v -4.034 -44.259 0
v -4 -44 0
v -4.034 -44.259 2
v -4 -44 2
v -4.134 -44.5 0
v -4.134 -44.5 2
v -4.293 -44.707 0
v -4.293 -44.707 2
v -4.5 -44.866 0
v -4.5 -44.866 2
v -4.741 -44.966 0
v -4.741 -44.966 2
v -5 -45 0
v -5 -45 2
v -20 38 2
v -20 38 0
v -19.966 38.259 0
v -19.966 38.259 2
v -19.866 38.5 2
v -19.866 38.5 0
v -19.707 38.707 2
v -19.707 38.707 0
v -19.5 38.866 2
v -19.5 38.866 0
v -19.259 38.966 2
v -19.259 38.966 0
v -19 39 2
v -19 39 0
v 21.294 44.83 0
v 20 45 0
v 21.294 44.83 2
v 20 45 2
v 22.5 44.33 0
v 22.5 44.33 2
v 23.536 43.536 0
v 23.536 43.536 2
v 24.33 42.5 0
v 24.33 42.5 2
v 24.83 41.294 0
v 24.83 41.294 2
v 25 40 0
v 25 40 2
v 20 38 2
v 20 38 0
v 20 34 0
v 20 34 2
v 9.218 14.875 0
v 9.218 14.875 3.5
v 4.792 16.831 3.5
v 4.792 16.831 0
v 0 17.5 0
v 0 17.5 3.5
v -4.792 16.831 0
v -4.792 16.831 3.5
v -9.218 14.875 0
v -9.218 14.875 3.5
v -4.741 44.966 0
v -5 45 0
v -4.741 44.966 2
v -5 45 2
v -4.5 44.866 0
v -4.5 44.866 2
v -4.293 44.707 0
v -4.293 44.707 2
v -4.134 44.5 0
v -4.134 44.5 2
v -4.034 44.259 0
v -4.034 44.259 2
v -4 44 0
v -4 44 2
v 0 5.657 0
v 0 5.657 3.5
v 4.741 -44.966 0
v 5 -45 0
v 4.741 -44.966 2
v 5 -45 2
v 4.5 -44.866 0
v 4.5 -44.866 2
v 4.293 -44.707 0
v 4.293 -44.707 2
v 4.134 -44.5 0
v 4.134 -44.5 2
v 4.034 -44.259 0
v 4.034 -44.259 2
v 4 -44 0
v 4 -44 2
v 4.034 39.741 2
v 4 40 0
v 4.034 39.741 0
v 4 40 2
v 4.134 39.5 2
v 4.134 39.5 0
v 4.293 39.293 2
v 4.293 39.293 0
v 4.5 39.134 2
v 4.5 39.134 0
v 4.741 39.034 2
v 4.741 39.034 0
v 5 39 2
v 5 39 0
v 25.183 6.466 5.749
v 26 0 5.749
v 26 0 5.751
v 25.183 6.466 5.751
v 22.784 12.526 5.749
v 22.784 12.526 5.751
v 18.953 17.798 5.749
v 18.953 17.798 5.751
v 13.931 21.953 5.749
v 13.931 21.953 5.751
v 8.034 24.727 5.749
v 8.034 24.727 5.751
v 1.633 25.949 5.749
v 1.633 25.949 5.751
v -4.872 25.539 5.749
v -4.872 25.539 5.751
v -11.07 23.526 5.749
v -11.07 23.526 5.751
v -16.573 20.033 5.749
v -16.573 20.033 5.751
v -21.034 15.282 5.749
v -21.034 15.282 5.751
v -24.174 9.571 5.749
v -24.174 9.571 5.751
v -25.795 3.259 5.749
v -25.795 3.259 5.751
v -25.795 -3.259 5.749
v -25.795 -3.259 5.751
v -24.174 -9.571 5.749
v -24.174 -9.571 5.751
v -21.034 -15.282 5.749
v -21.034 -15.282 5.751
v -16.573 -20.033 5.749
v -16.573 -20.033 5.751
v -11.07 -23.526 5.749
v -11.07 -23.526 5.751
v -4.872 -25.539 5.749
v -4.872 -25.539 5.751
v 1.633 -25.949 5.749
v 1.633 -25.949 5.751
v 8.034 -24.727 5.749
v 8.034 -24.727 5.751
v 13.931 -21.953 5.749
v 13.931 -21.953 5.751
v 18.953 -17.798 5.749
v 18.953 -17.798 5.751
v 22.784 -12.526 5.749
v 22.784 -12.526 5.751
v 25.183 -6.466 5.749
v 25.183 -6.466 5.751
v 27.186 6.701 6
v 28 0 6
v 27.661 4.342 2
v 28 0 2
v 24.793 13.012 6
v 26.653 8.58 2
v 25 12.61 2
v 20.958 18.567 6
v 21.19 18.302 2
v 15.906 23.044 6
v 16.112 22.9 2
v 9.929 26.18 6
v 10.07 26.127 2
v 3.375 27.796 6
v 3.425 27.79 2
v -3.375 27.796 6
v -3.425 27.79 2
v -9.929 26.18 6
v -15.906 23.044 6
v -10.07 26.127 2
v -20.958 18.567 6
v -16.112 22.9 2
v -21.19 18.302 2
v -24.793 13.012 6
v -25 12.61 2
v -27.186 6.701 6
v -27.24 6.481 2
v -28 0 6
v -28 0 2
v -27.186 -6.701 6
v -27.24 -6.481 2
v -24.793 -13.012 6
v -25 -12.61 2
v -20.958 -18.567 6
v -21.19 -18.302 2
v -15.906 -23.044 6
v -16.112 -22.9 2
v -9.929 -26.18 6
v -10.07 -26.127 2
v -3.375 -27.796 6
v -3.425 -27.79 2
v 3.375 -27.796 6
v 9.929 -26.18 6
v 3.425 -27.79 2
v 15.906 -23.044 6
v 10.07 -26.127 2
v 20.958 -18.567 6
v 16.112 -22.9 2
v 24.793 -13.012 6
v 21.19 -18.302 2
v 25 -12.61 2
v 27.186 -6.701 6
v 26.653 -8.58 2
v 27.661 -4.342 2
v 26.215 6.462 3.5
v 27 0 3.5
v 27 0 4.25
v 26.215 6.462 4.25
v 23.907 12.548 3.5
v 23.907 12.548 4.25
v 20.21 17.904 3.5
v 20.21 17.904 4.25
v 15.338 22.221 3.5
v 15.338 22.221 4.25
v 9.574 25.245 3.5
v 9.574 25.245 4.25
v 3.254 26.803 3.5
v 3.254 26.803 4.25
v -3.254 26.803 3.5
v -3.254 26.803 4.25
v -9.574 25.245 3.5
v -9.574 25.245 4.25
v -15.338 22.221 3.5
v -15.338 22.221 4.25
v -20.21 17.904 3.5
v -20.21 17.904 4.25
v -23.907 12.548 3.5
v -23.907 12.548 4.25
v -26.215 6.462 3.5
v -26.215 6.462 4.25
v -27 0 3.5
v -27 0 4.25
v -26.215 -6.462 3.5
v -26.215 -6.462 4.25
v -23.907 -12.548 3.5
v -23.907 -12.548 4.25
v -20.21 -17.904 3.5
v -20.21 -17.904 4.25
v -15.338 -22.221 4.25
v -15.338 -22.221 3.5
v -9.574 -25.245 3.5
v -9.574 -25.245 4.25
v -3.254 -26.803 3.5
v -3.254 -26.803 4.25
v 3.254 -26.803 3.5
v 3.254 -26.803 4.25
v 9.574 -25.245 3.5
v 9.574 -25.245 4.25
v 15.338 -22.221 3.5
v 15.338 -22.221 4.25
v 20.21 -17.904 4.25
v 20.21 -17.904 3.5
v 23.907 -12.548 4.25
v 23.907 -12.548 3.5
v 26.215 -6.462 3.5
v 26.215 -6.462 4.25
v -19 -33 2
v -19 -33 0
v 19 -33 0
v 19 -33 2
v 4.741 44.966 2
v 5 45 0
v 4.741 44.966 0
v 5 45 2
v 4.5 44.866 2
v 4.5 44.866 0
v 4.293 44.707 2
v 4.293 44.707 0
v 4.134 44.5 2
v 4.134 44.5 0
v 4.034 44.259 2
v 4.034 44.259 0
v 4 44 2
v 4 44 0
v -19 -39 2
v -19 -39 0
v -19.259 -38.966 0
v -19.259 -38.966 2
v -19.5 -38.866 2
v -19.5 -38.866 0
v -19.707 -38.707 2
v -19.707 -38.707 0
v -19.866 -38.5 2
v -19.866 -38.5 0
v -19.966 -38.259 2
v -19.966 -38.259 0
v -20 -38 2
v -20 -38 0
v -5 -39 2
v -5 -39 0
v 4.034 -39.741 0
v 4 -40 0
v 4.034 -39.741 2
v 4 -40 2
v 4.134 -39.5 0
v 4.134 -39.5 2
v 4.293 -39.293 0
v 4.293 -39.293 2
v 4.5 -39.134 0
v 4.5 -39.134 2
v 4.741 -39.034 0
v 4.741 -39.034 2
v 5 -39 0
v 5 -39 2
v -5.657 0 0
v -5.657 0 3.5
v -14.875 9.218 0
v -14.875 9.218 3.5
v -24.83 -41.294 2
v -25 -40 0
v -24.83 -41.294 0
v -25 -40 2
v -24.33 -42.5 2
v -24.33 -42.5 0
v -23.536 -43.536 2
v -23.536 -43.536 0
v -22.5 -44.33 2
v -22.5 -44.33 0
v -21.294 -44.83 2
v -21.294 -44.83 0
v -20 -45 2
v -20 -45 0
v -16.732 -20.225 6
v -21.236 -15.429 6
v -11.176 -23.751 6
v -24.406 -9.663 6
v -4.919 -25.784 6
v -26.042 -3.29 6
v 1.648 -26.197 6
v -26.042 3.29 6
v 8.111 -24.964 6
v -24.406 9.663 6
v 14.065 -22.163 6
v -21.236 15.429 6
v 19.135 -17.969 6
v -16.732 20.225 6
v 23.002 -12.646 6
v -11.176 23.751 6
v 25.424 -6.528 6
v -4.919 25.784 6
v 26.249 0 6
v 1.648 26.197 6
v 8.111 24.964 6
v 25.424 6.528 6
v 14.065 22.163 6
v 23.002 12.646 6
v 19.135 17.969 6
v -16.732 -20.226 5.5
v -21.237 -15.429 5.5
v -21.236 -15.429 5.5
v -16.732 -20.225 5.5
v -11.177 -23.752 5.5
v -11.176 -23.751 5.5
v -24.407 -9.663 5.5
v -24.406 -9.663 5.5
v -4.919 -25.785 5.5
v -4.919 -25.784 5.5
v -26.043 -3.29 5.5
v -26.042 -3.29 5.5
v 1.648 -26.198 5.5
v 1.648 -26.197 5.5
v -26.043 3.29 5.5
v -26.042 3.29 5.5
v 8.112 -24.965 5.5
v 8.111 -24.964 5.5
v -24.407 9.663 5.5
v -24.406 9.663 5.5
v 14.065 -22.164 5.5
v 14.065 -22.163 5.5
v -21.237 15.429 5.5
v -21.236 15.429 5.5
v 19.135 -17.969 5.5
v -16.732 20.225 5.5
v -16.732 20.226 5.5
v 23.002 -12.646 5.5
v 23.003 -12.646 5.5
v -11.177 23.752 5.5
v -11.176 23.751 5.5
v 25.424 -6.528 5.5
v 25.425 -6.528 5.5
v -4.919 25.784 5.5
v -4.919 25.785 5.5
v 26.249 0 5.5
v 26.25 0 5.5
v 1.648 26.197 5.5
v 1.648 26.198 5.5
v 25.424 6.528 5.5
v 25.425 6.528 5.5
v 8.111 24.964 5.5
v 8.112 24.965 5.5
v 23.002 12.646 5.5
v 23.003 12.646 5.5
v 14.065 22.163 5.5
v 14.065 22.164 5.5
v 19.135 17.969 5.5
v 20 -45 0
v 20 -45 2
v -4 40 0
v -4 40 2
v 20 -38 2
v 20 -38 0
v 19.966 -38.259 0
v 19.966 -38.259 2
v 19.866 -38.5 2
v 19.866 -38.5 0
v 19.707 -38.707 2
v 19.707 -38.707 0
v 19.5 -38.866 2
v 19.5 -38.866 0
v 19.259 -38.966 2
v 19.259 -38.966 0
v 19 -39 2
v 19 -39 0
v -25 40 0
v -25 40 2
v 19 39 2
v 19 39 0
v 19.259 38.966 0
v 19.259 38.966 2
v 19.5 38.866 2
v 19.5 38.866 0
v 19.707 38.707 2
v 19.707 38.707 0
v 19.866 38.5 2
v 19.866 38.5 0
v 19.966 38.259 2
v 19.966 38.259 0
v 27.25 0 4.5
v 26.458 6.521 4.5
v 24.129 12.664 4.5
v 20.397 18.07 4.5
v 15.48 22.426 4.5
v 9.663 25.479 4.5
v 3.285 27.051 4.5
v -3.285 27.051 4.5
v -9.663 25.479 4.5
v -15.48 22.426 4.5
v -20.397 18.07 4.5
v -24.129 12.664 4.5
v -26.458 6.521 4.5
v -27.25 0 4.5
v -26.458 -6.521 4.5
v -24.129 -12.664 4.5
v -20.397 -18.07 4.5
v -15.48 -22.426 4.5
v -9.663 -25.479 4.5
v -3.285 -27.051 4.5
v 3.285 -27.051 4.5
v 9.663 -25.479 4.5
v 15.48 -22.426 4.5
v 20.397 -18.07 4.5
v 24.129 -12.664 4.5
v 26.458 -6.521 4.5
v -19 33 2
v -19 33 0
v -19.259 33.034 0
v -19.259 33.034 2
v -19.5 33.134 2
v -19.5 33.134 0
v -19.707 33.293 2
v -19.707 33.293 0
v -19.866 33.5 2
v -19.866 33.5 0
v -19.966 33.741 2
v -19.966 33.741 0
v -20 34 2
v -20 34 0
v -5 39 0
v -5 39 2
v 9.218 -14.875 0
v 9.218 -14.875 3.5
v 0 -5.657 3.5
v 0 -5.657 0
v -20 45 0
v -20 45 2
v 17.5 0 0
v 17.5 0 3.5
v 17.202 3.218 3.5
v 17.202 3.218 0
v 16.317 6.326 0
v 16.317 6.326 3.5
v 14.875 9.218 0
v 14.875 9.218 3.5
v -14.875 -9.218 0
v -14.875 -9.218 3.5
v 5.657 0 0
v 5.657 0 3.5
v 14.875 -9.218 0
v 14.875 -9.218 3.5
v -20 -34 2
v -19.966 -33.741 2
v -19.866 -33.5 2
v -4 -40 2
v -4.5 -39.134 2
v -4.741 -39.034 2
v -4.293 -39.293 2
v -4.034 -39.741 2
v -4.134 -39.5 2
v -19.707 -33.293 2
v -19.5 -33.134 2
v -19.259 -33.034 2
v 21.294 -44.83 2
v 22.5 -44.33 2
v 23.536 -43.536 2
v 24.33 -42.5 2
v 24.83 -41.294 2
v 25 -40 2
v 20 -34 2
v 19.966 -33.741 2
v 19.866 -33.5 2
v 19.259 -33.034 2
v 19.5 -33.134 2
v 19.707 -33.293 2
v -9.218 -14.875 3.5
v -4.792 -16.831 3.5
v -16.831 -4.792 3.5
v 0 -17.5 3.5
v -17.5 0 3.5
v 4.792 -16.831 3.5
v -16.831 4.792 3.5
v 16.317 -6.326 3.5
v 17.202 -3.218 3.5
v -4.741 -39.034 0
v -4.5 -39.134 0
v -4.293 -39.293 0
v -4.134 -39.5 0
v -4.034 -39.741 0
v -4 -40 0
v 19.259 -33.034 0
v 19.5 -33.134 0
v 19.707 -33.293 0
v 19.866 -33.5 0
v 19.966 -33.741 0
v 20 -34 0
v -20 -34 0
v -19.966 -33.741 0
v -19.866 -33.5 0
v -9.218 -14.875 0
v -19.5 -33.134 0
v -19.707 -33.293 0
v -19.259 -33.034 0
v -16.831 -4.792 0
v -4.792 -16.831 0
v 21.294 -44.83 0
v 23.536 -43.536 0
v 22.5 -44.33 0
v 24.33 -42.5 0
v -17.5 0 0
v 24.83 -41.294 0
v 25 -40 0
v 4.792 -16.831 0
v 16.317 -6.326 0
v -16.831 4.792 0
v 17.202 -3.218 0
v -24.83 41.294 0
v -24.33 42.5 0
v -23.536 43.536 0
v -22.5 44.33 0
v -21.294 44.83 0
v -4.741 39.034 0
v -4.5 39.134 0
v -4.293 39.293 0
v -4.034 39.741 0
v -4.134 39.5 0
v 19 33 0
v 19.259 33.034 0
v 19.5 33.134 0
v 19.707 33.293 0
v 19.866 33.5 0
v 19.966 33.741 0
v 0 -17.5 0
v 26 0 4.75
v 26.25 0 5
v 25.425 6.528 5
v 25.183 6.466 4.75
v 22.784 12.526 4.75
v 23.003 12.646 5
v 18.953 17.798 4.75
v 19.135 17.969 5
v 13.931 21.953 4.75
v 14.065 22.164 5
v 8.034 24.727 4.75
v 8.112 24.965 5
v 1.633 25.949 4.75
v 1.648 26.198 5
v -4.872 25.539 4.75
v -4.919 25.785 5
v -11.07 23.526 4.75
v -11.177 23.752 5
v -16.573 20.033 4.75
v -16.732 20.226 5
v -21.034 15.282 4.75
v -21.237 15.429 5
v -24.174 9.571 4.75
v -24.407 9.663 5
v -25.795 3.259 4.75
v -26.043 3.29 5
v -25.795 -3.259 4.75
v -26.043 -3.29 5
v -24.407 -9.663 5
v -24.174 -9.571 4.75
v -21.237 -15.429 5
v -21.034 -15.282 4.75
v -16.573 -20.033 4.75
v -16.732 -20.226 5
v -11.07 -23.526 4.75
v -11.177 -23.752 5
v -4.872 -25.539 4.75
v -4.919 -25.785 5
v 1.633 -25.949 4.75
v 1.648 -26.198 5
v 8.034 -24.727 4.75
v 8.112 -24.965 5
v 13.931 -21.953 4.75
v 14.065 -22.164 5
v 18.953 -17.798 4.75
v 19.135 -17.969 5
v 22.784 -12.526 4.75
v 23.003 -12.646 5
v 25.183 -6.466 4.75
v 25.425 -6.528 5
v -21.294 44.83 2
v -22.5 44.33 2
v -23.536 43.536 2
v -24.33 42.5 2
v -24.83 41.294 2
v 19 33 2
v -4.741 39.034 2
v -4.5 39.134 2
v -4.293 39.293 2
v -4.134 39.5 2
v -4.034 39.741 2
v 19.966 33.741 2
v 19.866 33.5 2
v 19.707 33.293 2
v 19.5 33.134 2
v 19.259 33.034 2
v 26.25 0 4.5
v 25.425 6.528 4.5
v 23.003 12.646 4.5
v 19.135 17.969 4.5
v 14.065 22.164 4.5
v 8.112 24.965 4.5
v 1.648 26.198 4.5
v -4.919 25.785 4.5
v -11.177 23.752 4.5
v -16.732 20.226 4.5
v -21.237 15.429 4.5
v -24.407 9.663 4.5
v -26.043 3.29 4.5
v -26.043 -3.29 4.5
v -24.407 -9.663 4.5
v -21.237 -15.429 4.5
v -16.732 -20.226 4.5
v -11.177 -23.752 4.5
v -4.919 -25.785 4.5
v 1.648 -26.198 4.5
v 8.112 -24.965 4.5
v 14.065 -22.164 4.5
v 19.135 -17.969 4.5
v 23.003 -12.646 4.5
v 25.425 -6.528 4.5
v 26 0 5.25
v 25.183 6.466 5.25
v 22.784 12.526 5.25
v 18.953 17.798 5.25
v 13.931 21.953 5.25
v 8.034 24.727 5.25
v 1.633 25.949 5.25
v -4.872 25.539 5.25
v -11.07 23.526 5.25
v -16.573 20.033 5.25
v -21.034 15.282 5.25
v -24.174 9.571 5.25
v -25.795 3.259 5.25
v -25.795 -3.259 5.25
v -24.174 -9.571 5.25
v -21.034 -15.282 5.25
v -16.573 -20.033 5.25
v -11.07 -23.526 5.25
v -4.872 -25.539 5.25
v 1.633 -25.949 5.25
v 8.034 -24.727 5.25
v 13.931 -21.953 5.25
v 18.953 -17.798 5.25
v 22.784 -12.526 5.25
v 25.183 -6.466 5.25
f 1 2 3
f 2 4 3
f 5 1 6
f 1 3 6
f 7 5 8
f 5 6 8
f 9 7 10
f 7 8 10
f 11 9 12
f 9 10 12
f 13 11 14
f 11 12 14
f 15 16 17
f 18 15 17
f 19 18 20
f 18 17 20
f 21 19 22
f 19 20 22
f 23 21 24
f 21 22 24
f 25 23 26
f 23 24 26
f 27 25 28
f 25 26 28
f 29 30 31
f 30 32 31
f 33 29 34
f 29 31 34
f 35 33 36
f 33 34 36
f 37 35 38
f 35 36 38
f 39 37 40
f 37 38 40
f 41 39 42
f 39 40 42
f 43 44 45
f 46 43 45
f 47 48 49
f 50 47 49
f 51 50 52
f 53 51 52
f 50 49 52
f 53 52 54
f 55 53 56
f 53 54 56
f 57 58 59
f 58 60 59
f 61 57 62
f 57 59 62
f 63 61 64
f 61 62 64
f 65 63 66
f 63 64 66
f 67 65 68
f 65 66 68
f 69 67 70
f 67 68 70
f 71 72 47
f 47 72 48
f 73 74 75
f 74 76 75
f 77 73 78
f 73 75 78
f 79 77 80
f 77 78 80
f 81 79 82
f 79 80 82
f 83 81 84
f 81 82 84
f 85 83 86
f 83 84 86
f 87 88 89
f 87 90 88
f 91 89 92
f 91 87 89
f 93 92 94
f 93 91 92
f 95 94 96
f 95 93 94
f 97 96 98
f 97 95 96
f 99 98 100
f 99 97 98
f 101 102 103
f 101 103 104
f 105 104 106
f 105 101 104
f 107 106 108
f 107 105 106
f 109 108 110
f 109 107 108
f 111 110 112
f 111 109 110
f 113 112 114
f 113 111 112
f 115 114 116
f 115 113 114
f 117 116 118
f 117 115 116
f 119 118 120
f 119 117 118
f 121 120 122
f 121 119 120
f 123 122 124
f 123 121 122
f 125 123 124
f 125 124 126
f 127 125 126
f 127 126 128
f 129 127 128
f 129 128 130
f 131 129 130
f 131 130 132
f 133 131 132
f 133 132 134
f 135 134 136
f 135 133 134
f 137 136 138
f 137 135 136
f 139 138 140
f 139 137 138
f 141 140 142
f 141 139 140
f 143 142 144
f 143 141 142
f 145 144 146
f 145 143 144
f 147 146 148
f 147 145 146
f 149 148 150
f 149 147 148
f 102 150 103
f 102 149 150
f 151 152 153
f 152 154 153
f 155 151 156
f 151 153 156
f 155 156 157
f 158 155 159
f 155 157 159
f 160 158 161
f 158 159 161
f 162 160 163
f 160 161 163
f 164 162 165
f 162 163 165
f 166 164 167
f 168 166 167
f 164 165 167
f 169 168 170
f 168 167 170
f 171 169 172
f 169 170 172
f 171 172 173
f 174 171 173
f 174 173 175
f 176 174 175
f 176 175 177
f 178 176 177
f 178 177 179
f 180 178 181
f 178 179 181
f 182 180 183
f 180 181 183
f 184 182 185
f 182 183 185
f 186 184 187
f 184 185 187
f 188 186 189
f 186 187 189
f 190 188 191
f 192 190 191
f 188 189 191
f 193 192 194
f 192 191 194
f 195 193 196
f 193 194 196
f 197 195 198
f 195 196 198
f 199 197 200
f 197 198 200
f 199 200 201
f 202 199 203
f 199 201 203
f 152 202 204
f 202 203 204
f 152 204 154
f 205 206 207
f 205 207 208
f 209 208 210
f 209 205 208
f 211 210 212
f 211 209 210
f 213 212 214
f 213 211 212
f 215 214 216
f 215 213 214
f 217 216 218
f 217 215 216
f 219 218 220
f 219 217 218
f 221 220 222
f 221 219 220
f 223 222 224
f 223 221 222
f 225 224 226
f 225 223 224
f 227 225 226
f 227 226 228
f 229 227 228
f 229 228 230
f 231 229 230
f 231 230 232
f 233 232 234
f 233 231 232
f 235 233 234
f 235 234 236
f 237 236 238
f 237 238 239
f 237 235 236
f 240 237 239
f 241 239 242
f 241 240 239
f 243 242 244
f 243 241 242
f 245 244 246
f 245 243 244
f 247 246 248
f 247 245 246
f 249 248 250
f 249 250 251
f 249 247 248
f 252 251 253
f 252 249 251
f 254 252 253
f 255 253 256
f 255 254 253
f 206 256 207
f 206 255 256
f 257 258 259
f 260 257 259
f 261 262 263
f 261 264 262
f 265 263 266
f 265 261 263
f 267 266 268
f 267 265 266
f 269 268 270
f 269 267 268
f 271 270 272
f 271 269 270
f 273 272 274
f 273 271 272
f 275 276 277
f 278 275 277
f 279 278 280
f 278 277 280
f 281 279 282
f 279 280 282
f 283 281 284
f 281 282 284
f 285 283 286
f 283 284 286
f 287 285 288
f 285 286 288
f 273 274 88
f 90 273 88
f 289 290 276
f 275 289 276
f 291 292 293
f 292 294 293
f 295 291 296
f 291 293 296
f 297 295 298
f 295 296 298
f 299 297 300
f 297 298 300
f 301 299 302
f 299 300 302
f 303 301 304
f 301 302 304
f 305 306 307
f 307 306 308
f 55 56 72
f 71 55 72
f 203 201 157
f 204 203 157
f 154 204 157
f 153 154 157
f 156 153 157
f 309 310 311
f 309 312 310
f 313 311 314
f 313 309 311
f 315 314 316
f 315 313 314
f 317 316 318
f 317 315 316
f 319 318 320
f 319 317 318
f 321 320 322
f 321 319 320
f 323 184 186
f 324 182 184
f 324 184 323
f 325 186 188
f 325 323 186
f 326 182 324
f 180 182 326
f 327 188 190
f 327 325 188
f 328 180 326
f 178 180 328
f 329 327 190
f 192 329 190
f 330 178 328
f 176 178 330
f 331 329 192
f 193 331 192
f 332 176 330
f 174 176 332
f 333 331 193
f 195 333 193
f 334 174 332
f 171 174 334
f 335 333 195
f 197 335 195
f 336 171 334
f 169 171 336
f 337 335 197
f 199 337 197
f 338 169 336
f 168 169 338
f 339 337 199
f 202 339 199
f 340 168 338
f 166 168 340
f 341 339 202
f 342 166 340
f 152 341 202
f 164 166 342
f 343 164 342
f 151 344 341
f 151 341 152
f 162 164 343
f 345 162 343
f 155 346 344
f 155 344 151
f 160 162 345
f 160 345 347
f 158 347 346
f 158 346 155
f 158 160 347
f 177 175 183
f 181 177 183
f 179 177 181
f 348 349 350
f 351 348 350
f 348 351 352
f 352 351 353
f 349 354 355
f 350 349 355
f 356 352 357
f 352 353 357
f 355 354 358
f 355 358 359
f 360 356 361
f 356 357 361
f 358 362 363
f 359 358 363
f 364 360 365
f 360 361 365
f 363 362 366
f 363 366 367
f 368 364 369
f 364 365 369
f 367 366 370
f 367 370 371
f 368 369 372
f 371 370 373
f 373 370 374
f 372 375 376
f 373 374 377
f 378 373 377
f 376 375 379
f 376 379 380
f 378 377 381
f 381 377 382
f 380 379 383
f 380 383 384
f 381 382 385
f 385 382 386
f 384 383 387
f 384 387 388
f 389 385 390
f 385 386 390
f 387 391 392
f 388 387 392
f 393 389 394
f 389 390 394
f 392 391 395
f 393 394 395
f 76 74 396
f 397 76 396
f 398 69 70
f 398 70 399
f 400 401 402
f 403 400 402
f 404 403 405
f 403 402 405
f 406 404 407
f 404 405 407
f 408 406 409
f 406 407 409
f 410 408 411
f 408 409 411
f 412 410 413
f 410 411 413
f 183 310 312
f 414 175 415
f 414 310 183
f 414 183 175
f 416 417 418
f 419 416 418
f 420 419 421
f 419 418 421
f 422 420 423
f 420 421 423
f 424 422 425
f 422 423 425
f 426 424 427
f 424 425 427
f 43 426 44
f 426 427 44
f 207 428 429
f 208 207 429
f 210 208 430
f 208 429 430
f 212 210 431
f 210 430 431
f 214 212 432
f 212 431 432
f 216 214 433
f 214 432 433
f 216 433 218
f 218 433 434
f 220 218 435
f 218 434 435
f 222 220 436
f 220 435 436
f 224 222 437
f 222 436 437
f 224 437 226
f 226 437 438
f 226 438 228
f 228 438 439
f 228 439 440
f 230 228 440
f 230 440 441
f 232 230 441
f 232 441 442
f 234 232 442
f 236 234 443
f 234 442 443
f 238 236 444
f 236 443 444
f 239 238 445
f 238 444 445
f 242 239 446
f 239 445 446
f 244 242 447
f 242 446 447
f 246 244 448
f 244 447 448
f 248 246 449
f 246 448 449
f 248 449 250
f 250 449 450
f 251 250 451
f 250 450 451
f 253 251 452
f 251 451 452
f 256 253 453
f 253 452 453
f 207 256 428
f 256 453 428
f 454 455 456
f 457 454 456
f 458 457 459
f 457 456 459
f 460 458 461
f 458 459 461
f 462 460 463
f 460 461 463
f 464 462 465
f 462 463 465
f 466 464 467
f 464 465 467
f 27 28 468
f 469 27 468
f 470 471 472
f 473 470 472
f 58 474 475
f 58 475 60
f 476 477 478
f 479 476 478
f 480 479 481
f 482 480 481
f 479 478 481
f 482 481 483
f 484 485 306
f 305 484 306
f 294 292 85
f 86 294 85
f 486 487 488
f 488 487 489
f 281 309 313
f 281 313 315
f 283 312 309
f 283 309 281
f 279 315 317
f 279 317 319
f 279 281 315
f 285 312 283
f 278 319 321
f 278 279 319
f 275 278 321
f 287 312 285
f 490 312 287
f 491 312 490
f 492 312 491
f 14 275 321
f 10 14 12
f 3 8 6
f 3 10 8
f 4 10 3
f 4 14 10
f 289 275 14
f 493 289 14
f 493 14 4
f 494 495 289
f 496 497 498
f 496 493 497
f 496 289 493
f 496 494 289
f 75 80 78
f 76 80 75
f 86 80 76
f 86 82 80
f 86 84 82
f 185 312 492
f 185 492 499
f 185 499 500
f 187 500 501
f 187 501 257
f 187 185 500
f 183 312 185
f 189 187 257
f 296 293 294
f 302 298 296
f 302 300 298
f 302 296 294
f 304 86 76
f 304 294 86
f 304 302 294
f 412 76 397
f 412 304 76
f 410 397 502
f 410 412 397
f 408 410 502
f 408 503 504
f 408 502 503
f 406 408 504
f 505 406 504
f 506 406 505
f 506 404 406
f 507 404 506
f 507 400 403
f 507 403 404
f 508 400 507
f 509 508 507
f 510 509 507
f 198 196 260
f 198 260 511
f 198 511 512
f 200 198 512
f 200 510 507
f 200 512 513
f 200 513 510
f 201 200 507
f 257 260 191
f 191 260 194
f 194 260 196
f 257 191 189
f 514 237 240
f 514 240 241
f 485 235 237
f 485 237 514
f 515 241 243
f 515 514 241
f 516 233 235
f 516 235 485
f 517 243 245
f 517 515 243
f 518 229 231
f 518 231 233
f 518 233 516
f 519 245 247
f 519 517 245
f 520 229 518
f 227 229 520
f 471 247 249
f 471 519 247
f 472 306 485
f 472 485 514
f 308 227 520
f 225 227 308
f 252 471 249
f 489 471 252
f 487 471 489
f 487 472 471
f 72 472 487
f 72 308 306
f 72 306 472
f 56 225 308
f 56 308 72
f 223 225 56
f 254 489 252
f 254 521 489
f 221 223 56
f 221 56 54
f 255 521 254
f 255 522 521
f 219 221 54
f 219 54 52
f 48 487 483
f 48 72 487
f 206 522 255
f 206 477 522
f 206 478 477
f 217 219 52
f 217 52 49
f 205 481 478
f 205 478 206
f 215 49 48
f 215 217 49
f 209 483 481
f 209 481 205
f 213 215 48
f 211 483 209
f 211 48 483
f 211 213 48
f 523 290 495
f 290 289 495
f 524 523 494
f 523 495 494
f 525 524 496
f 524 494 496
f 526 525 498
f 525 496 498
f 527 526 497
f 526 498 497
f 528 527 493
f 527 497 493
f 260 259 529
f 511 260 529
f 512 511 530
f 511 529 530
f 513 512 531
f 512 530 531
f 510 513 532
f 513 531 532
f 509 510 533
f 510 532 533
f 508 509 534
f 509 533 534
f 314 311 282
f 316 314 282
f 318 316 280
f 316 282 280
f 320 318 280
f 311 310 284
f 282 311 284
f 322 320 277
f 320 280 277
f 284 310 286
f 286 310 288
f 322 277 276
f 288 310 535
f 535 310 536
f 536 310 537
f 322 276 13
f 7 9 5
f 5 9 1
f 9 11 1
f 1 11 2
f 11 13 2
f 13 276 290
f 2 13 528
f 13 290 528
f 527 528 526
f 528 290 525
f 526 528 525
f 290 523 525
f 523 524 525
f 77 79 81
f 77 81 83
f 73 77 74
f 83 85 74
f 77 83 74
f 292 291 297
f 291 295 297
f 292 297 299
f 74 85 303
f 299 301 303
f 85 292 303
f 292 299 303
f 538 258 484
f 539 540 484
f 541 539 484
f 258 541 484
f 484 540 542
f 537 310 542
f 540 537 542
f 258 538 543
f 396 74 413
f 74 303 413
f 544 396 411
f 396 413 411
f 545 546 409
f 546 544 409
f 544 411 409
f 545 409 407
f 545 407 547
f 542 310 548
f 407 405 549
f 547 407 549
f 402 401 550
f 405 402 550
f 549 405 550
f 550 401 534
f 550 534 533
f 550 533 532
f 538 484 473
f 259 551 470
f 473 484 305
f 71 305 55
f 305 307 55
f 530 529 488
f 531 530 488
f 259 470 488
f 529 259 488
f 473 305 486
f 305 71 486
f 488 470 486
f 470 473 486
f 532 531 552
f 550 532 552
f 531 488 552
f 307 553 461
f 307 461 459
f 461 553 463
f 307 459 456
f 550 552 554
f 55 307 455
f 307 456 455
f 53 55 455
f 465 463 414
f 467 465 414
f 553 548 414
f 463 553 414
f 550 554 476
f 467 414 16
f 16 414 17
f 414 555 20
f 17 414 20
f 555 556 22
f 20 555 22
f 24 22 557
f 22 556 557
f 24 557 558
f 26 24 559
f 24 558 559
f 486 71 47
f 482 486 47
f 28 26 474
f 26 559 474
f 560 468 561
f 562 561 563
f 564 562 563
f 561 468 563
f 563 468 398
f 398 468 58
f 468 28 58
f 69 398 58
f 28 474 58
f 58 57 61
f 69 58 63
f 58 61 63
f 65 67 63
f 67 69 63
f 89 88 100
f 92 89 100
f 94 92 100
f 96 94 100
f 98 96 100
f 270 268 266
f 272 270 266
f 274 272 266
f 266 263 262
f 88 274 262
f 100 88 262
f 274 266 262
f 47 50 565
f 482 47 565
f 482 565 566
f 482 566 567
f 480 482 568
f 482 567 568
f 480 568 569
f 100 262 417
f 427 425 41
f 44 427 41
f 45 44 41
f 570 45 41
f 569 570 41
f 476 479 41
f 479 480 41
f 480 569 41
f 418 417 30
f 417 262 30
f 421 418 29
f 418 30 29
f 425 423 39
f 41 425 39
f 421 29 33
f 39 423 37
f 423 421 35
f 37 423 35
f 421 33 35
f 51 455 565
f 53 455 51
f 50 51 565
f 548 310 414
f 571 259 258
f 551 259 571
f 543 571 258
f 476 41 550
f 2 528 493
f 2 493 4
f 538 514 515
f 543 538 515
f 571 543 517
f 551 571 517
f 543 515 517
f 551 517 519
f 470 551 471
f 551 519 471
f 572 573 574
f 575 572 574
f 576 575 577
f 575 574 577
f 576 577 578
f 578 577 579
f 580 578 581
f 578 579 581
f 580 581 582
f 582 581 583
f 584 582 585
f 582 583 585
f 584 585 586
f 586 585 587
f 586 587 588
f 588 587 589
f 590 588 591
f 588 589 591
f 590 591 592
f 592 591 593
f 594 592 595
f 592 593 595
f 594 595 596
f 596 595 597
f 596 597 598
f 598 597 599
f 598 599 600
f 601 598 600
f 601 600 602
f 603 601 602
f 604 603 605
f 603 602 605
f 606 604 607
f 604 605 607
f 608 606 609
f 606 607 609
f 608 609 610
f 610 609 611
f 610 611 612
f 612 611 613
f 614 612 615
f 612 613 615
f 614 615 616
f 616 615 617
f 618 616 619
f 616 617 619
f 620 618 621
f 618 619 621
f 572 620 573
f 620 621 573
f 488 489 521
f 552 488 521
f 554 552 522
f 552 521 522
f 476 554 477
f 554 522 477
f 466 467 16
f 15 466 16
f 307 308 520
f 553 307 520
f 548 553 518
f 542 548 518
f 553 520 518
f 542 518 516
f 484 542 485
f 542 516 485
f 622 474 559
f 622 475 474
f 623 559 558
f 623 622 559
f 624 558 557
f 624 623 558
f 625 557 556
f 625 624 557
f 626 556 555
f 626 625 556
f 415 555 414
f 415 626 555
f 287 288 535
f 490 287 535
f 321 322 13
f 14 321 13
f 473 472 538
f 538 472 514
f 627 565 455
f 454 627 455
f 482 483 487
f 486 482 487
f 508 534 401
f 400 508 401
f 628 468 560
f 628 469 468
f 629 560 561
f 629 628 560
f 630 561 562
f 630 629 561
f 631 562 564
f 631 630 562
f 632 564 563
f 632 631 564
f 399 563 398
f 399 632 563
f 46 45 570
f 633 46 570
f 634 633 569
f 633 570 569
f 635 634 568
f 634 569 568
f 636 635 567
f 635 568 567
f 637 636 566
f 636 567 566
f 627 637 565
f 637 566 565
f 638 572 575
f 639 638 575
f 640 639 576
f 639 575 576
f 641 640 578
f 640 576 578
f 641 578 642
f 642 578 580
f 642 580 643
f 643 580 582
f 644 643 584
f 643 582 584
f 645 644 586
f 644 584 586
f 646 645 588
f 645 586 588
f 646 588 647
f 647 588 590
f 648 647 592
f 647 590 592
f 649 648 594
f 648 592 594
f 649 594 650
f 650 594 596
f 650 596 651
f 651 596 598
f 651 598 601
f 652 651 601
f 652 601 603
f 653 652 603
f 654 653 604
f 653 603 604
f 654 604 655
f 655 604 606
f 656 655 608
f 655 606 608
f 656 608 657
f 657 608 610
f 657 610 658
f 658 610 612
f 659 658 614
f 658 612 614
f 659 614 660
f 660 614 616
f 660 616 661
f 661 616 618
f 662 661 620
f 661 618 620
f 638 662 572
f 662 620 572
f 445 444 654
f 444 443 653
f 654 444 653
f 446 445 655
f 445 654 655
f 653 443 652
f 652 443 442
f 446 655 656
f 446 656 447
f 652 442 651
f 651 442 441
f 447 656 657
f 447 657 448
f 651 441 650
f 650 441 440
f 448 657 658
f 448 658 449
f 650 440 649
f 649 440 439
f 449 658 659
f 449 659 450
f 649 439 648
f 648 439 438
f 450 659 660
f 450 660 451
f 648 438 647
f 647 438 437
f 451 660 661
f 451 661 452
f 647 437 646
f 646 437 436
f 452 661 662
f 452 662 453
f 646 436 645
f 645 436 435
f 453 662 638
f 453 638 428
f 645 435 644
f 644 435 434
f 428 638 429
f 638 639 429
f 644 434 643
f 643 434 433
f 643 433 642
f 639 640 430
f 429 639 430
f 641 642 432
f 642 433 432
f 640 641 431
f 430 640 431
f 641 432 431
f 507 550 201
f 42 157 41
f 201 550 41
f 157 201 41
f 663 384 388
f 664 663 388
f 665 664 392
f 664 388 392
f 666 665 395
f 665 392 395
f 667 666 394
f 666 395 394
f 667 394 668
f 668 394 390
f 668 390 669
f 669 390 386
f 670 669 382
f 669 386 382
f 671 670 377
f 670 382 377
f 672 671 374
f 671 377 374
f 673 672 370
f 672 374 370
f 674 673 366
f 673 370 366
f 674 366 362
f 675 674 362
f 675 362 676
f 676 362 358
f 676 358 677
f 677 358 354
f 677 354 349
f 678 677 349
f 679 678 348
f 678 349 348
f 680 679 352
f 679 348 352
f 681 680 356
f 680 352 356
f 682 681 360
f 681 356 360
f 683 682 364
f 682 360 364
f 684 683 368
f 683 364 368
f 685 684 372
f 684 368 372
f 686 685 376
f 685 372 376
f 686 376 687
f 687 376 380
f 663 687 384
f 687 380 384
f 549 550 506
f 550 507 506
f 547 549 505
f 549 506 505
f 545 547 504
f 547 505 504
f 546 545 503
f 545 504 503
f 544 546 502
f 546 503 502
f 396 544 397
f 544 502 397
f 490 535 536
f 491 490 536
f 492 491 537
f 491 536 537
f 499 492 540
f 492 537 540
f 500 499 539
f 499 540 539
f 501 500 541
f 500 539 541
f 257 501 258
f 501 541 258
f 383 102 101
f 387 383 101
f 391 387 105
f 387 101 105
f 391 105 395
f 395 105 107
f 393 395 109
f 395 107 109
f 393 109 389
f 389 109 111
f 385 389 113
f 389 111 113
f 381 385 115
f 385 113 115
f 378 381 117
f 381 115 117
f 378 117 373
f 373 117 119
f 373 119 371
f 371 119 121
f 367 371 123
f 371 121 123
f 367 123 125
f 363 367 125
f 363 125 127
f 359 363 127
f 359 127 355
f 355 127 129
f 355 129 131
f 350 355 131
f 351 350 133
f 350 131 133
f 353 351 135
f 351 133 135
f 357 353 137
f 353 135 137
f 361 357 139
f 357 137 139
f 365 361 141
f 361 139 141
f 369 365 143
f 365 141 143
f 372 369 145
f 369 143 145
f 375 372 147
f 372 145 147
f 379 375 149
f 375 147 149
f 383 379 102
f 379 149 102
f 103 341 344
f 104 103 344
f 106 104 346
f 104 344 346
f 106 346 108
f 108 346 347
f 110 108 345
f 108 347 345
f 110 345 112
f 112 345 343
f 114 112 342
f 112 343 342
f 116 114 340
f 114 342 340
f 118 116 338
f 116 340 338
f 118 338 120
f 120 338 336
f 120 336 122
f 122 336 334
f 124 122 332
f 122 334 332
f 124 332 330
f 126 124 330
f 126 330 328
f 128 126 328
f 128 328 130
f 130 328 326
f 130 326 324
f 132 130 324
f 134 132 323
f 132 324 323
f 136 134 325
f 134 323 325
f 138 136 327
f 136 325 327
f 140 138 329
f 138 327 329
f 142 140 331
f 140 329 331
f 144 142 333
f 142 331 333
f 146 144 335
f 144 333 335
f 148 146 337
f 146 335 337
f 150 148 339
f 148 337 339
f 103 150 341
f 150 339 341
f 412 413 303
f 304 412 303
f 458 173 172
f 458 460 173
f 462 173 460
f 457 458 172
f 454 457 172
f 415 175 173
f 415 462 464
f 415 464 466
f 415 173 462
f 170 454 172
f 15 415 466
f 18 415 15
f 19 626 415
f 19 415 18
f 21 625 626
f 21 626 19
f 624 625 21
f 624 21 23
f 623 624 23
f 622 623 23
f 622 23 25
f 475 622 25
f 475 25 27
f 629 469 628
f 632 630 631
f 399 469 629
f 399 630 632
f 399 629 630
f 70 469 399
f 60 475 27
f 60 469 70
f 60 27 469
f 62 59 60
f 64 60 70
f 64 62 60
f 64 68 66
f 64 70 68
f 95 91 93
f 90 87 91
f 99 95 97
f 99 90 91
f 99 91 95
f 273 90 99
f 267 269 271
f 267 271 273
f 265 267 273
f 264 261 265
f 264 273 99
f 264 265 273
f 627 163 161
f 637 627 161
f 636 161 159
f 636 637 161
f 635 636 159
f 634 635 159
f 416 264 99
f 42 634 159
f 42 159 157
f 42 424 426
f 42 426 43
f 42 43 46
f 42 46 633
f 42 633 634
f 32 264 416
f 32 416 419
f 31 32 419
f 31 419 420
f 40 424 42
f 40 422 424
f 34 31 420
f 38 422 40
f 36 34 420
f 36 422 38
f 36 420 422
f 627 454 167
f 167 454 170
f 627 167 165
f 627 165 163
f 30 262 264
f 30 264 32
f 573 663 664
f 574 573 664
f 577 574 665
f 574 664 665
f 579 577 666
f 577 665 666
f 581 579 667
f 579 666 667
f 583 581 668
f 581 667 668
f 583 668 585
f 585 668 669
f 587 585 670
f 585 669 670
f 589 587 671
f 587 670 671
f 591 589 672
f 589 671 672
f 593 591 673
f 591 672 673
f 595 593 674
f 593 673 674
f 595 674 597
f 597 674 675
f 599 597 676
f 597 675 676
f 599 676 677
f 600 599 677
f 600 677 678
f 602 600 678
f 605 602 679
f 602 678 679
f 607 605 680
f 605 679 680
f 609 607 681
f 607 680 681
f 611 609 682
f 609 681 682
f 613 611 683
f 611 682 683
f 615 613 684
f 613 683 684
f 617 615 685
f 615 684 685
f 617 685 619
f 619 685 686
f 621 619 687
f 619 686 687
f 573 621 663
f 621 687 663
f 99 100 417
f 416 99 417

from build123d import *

# Parameters (mm, degrees)
F0_W      = 50
F0_H      = 90
F1_DEPTH  = 2
F2_R      = 28
F3_DEPTH  = 1.5
F4_R      = 28
F4_R_2    = 27
F5_DEPTH  = 1
F6_W      = 3
F6_H      = 70
F7_DEPTH  = 3
F8_DEPTH  = 3
F10_DEPTH = 25
F11_W     = 8
F11_H     = 6
F12_DEPTH = 25
F13_R     = 1
F14_R     = 1
F15_R     = 5
F18_SIZE  = 0.25
F19_R     = 28
F19_R_2   = 27.25
F19_R_3   = 26
F20_DEPTH = 0.5
F21_SIZE  = 0.24999
F22_R     = 28
F22_R_2   = 26.24999
F22_R_3   = 26
F23_DEPTH = 0.5
F24_SIZE  = 0.2499
F25_R     = 28
F25_R_2   = 26.2499
F25_R_3   = 26
F26_DEPTH = 0.5
F27_SIZE  = 0.249


# Not quite as in the source:
# - a fillet or chamfer is up to 0.001 mm smaller than in the source, because OpenCascade refuses the exact size


with BuildPart() as f1:
    # F0 (on Top) → F1 (new body)
    with BuildSketch(Plane.XY):
        Rectangle(F0_W, F0_H)
    extrude(amount=F1_DEPTH)

    # F2 (on face) → F3 (join)
    with BuildSketch(Plane.XY.offset(2)):
        Circle(F2_R)
    extrude(amount=F3_DEPTH)

    # F4 (on face) → F5 (join)
    with BuildSketch(Plane.XY.offset(3.5)):
        Circle(F4_R)
        Circle(F4_R_2, mode=Mode.SUBTRACT)
    extrude(amount=F5_DEPTH)

    # F6 (on face) → F7 (join)
    with BuildSketch(Plane(origin=(0, 0, 0), x_dir=(1, 0, 0), z_dir=(0, 0, -1))):
        with Locations((-23.5, 0)):
            Rectangle(F6_W, F6_H)
        with Locations((23.5, 0)):
            Rectangle(F6_W, F6_H)
    extrude(amount=F7_DEPTH)

    # F8 (cut, through all): faces of the model
    f8_faces = [f1.faces().sort_by_distance(p)[0] for p in [
        (-23.5, 0, -3),
        (23.5, 0, -3),
        (-23.5, 0, -3),
        (23.5, 0, -3),
    ]]
    extrude(f8_faces, amount=-F8_DEPTH, mode=Mode.SUBTRACT)

    # F9 (on face) → F10 (cut)
    with BuildSketch(Plane.XY.offset(3.5)):
        with BuildLine():
            Line((-5.6568542495, 0), (-14.8752109279, 9.2183566784))
            ThreePointArc((-14.8752109279, 9.2183566784), (-17.5, 0), (-14.8752109279, -9.2183566784))
            Line((-14.8752109279, -9.2183566784), (-5.6568542495, 0))
        make_face()
        with BuildLine():
            ThreePointArc((-9.2183566784, -14.8752109279), (0, -17.5), (9.2183566784, -14.8752109279))
            Line((9.2183566784, -14.8752109279), (0, -5.6568542495))
            Line((0, -5.6568542495), (-9.2183566784, -14.8752109279))
        make_face()
        with BuildLine():
            ThreePointArc((14.8752109279, -9.2183566784), (16.831015882, -4.7923798244), (17.5, 0))
            ThreePointArc((17.5, 0), (16.831015882, 4.7923798244), (14.8752109279, 9.2183566784))
            Line((14.8752109279, 9.2183566784), (5.6568542495, 0))
            Line((5.6568542495, 0), (14.8752109279, -9.2183566784))
        make_face()
        with BuildLine():
            Line((0, 5.6568542495), (9.2183566784, 14.8752109279))
            ThreePointArc((9.2183566784, 14.8752109279), (0, 17.5), (-9.2183566784, 14.8752109279))
            Line((-9.2183566784, 14.8752109279), (0, 5.6568542495))
        make_face()
    extrude(amount=-F10_DEPTH, mode=Mode.SUBTRACT)

    # F11 (on face) → F12 (cut)
    with BuildSketch(Plane(origin=(0, 0, 0), x_dir=(1, 0, 0), z_dir=(0, 0, -1))):
        with Locations((0, -42)):
            Rectangle(F11_W, F11_H)
        with BuildLine():
            Line((-4, -39), (4, -39))
            Line((4, -39), (19, -39))
            ThreePointArc((19, -39), (19.7071067812, -38.7071067812), (20, -38))
            Line((20, -38), (20, -34))
            ThreePointArc((20, -34), (19.7071067812, -33.2928932188), (19, -33))
            Line((19, -33), (-19, -33))
            ThreePointArc((-19, -33), (-19.7071067812, -33.2928932188), (-20, -34))
            Line((-20, -34), (-20, -38))
            ThreePointArc((-20, -38), (-19.7071067812, -38.7071067812), (-19, -39))
            Line((-19, -39), (-4, -39))
        make_face()
        with Locations((0, 42)):
            Rectangle(F11_W, F11_H)
        with BuildLine():
            ThreePointArc((20, 38), (19.7071067812, 38.7071067812), (19, 39))
            Line((19, 39), (4, 39))
            Line((4, 39), (-4, 39))
            Line((-4, 39), (-19, 39))
            ThreePointArc((-19, 39), (-19.7071067812, 38.7071067812), (-20, 38))
            Line((-20, 38), (-20, 34))
            ThreePointArc((-20, 34), (-19.7071067812, 33.2928932188), (-19, 33))
            Line((-19, 33), (19, 33))
            ThreePointArc((19, 33), (19.7071067812, 33.2928932188), (20, 34))
            Line((20, 34), (20, 38))
        make_face()
    extrude(amount=-F12_DEPTH, mode=Mode.SUBTRACT)

    # F13
    f13_edges = [f1.edges().sort_by_distance(p)[0] for p in [
        (-4, -45, 1),
        (-4, -39, 1),
        (4, -45, 1),
        (4, -39, 1),
    ]]
    fillet(f13_edges, radius=F13_R)

    # F14
    f14_edges = [f1.edges().sort_by_distance(p)[0] for p in [
        (4, 45, 1),
        (4, 39, 1),
        (-4, 45, 1),
        (-4, 39, 1),
    ]]
    fillet(f14_edges, radius=F14_R)

    # F15
    f15_edges = [f1.edges().sort_by_distance(p)[0] for p in [
        (25, -45, 1),
        (25, 45, 1),
        (-25, 45, 1),
        (-25, -45, 1),
    ]]
    fillet(f15_edges, radius=F15_R)


with BuildPart() as f16_1:
    # F16: copy of F1
    add(f1.part.moved(Location((72.1, 0, 0))))


with BuildPart() as f1_1:
    add(f1.part)

    # F18
    f18_edges = [f1_1.edges().sort_by_distance(p)[0] for p in [
        (-27, 0, 4.5),
    ]]
    chamfer(f18_edges, length=F18_SIZE)

    # F19 (on face) → F20 (join)
    with BuildSketch(Plane.XY.offset(4.5)):
        Circle(F19_R)
        Circle(F19_R_2, mode=Mode.SUBTRACT)
        Circle(F19_R_2)
        Circle(F19_R_3, mode=Mode.SUBTRACT)
    extrude(amount=F20_DEPTH)

    # F21 (size 0.25 in the source; OpenCascade refuses exactly that, so slightly less here)
    f21_edges = [f1_1.edges().sort_by_distance(p)[0] for p in [
        (-26, 0, 4.5),
        (-26, 0, 5),
    ]]
    chamfer(f21_edges, length=F21_SIZE)

    # F22 (on face) → F23 (join)
    with BuildSketch(Plane.XY.offset(5)):
        Circle(F22_R)
        Circle(F22_R_2, mode=Mode.SUBTRACT)
        Circle(F22_R_2)
        Circle(F22_R_3, mode=Mode.SUBTRACT)
    extrude(amount=F23_DEPTH)

    # F24 (size 0.25 in the source; OpenCascade refuses exactly that, so slightly less here)
    f24_edges = [f1_1.edges().sort_by_distance(p)[0] for p in [
        (-26, 0, 5),
        (-26, 0, 5.5),
    ]]
    chamfer(f24_edges, length=F24_SIZE)

    # F25 (on face) → F26 (join)
    with BuildSketch(Plane.XY.offset(5.5)):
        Circle(F25_R)
        Circle(F25_R_2, mode=Mode.SUBTRACT)
        Circle(F25_R_2)
        Circle(F25_R_3, mode=Mode.SUBTRACT)
    extrude(amount=F26_DEPTH)

    # F27 (size 0.25 in the source; OpenCascade refuses exactly that, so slightly less here)
    f27_edges = [f1_1.edges().sort_by_distance(p)[0] for p in [
        (-26, 0, 6),
        (-26, 0, 5.5),
    ]]
    chamfer(f27_edges, length=F27_SIZE)


solid = f1_1.part
